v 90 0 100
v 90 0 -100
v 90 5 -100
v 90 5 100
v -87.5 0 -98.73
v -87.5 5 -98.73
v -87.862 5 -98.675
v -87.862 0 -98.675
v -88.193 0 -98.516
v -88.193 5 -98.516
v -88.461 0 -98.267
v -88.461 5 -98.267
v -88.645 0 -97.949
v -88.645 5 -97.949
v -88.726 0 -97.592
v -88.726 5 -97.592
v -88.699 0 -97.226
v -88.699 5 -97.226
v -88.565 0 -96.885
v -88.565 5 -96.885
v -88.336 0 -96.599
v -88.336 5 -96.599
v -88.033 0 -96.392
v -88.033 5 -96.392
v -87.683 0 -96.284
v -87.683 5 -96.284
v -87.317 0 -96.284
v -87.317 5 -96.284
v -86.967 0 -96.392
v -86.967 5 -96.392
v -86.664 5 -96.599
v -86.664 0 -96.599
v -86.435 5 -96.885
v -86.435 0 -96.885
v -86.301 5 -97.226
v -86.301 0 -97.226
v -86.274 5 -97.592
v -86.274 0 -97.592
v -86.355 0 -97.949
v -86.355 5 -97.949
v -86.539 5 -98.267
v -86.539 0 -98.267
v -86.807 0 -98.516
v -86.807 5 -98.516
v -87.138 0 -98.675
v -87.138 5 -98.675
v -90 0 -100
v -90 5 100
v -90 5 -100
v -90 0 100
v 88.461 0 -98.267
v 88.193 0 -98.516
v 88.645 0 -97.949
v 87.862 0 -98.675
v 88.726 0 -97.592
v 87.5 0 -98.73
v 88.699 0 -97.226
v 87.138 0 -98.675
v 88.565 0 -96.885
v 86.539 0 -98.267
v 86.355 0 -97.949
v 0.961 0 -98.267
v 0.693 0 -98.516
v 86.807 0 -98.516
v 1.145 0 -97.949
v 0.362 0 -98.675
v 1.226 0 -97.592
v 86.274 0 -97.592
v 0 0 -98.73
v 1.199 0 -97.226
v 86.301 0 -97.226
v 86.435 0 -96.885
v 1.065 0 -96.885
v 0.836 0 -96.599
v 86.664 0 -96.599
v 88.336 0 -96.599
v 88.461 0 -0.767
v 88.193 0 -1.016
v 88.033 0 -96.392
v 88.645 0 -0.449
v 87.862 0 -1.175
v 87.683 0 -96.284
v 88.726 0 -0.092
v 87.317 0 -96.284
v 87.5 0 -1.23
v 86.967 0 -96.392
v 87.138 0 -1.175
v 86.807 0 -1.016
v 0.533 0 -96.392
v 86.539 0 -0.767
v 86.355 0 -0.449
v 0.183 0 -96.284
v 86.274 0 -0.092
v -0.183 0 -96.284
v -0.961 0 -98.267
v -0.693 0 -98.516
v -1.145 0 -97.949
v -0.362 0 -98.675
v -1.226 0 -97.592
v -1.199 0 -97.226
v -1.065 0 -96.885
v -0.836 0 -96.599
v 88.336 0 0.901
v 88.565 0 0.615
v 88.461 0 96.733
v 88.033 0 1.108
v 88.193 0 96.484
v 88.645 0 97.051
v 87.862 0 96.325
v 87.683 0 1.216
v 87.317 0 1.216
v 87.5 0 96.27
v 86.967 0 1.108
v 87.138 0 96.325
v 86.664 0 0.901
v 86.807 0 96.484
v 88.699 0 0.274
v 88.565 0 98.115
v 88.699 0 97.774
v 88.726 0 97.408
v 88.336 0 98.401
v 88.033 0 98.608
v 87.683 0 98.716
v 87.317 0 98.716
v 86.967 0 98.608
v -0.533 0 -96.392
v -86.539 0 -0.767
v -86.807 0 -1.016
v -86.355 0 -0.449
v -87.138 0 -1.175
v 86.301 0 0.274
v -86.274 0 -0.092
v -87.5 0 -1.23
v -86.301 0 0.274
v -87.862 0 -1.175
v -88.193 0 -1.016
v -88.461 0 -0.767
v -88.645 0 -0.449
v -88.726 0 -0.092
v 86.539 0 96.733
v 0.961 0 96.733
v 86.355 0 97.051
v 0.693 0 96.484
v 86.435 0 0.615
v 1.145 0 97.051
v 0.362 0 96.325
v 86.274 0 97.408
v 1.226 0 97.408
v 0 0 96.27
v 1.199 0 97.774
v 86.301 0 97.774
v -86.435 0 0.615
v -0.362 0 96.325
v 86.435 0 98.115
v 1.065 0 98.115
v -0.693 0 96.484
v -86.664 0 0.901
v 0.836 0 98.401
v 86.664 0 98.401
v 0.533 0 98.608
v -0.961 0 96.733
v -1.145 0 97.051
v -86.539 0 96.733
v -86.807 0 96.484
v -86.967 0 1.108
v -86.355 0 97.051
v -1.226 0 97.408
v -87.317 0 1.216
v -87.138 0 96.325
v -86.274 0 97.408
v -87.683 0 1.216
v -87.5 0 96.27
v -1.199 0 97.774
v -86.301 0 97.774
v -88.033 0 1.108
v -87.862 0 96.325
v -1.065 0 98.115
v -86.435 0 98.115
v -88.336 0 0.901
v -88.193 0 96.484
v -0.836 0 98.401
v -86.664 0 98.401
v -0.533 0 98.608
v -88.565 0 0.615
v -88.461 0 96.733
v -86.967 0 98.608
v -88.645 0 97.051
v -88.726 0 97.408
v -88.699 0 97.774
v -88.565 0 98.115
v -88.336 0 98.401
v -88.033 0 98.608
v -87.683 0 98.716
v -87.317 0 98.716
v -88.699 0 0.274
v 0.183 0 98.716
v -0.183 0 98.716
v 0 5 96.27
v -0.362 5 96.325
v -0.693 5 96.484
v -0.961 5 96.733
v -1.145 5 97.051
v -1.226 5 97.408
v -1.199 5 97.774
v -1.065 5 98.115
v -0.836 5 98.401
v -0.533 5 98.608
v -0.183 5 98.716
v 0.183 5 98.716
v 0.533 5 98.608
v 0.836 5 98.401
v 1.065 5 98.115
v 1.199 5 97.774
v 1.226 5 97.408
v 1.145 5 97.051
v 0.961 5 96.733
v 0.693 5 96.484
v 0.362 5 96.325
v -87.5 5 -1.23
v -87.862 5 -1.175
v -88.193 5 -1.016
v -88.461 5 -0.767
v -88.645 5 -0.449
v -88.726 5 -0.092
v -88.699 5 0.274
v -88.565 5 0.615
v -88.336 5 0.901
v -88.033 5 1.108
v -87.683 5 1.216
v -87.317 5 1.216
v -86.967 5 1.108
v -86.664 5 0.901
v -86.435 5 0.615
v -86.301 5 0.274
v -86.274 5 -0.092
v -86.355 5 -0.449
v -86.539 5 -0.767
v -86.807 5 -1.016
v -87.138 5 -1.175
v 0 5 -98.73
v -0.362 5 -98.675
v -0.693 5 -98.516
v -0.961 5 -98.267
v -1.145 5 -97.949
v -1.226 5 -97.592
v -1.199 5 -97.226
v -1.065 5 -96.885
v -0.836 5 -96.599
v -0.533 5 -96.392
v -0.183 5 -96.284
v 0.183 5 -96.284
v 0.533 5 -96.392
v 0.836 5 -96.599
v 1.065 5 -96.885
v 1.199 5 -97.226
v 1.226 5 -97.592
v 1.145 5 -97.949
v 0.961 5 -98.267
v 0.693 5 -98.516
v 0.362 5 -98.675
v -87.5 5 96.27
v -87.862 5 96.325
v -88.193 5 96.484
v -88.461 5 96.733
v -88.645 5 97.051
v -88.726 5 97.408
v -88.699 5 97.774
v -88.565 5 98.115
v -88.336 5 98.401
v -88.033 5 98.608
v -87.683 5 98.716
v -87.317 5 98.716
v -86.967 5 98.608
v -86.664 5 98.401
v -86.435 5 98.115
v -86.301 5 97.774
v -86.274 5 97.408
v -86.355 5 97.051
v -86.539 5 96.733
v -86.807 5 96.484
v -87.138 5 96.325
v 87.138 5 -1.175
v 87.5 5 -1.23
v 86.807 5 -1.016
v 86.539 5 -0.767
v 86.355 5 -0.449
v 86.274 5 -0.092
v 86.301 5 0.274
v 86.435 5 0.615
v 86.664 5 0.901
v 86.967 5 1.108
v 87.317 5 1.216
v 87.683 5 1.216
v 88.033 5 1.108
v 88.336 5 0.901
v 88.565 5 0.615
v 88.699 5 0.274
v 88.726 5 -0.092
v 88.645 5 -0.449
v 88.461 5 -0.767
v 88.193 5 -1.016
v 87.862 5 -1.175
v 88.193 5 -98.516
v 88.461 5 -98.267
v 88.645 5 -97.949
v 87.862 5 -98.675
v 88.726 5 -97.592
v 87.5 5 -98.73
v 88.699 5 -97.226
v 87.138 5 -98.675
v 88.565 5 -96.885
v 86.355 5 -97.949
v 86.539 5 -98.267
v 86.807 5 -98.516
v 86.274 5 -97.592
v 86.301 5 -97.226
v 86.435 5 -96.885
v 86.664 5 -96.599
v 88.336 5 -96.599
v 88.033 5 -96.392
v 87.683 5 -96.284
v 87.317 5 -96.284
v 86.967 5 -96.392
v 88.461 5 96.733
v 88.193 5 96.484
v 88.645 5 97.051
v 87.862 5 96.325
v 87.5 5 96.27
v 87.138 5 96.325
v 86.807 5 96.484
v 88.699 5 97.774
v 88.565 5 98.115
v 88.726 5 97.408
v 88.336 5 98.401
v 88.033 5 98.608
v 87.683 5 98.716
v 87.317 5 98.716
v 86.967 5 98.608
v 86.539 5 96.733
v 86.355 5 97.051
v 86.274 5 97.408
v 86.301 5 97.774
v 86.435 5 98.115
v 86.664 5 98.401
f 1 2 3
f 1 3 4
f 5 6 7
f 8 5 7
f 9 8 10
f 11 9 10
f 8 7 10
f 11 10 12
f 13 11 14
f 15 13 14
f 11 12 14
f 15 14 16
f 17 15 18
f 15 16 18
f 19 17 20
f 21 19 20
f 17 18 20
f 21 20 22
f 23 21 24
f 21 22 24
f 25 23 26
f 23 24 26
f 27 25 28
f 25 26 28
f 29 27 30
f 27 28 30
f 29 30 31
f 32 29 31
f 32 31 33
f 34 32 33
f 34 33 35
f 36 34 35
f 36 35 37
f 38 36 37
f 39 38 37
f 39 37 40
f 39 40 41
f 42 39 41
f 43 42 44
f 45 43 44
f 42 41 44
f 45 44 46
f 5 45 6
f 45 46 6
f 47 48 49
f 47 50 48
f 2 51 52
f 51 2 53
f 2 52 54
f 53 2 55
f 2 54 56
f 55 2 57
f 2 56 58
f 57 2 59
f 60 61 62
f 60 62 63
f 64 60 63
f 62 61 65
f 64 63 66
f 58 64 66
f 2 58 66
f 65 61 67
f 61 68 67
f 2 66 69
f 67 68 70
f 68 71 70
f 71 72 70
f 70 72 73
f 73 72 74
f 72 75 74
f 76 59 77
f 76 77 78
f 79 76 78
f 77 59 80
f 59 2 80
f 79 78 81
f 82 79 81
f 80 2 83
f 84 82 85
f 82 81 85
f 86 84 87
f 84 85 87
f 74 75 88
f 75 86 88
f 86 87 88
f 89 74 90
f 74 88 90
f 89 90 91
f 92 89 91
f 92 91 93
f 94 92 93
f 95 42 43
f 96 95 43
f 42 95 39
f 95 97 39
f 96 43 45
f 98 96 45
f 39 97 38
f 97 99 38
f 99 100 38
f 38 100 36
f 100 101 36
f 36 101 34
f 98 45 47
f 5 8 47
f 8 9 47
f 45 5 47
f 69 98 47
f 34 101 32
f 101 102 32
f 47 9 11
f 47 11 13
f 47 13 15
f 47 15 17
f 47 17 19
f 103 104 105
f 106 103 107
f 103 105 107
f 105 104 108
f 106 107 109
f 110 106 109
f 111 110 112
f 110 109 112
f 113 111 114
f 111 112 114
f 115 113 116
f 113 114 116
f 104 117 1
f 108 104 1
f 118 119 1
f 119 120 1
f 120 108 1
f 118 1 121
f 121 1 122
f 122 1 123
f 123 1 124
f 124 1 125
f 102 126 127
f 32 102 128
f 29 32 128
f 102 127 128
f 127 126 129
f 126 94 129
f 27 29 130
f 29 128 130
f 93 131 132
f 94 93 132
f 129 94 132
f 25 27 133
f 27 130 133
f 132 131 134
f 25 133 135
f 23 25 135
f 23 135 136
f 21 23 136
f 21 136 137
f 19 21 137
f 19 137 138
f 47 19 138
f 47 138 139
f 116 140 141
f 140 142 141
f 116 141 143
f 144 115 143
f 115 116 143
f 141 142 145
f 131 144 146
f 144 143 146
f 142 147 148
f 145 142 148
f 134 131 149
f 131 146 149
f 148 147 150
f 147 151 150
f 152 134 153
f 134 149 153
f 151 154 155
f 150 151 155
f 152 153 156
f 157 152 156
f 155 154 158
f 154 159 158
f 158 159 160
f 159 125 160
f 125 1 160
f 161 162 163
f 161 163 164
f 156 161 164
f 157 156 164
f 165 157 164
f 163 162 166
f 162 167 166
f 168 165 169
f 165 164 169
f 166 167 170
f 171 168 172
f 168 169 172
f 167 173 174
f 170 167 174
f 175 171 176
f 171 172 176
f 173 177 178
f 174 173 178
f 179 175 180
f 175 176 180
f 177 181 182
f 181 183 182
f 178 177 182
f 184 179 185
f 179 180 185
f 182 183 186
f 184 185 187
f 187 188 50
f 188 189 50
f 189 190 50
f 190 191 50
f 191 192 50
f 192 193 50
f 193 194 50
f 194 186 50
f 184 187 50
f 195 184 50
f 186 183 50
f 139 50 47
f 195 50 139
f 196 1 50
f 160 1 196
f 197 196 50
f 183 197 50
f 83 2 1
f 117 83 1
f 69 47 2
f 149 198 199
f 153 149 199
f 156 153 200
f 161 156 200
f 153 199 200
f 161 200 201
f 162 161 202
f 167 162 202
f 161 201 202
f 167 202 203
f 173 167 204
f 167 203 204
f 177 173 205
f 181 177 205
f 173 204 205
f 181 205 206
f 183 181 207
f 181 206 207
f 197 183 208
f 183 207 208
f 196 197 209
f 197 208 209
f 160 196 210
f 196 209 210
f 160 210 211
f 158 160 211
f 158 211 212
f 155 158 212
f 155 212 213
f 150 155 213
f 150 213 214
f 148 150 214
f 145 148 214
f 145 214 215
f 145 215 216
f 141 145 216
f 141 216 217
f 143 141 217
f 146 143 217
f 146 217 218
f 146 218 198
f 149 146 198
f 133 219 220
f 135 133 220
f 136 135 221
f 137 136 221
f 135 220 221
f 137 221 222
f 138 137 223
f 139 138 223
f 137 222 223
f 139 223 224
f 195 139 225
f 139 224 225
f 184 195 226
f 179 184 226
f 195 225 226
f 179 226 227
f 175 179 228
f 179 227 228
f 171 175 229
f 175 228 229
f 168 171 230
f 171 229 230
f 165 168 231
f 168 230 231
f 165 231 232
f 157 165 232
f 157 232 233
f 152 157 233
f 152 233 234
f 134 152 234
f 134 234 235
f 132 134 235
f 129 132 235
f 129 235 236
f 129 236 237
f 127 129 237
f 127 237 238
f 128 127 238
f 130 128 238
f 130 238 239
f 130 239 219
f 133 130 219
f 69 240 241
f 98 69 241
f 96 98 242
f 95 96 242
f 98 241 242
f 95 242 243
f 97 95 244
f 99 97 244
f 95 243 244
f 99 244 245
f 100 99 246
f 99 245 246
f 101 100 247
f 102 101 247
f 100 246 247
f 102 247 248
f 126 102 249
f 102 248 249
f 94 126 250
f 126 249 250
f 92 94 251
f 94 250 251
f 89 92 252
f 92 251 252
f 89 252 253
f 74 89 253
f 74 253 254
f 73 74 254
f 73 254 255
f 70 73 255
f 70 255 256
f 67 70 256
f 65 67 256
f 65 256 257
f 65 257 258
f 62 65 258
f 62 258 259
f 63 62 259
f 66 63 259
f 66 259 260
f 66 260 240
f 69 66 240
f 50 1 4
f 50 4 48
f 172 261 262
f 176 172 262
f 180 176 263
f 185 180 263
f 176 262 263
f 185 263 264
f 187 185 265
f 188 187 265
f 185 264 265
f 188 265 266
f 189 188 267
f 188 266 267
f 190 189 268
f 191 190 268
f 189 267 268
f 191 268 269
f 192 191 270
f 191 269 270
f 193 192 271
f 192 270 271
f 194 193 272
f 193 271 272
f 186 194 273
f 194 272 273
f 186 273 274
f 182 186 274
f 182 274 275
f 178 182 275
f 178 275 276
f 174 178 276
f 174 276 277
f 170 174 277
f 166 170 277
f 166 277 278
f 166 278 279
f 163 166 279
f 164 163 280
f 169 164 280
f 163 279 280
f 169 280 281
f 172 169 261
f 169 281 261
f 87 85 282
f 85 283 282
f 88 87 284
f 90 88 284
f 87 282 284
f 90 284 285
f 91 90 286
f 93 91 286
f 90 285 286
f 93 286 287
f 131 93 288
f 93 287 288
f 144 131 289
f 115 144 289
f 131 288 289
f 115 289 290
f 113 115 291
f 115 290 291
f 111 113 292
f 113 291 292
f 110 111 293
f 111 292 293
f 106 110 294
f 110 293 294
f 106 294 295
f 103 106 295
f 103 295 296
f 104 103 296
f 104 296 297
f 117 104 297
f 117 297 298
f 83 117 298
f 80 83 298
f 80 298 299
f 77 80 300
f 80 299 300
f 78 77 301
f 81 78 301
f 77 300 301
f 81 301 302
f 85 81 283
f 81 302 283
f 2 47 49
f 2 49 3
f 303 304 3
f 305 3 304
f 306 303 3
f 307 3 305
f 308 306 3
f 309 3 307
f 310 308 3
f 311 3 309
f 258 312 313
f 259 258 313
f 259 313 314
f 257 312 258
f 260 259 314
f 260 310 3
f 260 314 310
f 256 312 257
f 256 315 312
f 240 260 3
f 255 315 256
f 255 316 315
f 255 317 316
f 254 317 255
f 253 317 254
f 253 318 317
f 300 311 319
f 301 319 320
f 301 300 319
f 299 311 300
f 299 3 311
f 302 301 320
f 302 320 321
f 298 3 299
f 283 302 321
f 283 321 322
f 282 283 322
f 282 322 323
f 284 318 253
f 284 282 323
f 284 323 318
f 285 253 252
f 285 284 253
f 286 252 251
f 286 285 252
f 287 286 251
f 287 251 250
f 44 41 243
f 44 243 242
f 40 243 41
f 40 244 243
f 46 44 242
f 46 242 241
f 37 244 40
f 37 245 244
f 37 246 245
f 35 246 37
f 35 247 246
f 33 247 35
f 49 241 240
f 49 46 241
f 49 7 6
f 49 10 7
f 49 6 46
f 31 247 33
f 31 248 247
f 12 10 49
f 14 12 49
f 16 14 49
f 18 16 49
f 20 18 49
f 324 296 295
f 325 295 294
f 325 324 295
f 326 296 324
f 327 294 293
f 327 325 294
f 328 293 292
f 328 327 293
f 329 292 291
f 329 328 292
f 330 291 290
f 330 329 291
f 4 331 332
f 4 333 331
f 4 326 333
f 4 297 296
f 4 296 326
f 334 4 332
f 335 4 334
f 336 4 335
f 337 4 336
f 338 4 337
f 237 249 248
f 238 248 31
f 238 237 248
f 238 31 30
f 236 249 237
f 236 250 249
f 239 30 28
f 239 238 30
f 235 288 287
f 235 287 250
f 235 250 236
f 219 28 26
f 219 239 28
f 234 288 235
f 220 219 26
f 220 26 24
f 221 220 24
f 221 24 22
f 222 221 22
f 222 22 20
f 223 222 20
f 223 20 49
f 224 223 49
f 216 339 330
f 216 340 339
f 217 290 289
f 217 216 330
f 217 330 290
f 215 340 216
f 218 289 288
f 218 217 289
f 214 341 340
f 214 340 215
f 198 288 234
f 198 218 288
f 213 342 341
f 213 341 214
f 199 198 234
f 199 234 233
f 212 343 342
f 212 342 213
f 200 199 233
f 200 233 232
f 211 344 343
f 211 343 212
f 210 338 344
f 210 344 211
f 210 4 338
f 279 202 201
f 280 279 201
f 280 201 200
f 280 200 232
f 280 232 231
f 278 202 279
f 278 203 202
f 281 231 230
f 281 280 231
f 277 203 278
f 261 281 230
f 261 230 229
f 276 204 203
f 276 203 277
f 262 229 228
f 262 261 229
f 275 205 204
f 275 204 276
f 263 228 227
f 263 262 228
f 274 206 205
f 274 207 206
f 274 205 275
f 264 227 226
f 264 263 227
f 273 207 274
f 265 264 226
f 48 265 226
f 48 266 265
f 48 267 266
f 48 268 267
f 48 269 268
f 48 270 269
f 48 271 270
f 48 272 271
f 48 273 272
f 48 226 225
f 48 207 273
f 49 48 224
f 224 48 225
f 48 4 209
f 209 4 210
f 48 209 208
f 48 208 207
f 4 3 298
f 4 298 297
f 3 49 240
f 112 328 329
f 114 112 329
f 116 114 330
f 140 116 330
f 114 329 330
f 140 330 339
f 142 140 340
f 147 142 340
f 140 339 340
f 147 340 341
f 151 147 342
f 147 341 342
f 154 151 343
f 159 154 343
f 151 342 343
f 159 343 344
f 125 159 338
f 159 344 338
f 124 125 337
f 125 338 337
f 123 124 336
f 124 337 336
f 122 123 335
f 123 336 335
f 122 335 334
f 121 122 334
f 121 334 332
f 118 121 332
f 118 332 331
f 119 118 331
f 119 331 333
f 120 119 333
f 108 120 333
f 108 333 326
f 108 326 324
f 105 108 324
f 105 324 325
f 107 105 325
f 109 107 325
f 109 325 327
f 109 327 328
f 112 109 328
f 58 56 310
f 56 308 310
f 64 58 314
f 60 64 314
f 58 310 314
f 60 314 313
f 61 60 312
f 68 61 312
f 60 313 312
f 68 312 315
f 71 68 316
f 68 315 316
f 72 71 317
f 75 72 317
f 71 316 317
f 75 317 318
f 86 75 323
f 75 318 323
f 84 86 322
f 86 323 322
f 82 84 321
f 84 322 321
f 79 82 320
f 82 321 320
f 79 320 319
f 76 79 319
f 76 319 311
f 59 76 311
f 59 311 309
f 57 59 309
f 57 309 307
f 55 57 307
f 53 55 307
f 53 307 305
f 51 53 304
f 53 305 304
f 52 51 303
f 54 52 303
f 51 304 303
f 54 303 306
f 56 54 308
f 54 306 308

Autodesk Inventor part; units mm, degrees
ref_plane "YZ Plane" through (0, 0, 0) normal (1, 0, 0) x (0, 1, 0)
ref_plane "XZ Plane" through (0, 0, 0) normal (0, 1, 0) x (-1, 0, 0)
ref_plane "XY Plane" through (0, 0, 0) normal (0, 0, 1) x (1, 0, 0)
sketch "Esquisse1" plane through (0, 0, 0) normal (0, 1, 0) x (-1, 0, 0)
  line L0 (90, -100) -> (-90, -100)
  line L1 (-90, -100) -> (-90, 100)
  line L2 (-90, 100) -> (90, 100)
  line L3 (90, 100) -> (90, -100)
  line L4 (90, -100) -> (-90, 100) construction
  line L5 (-90, -100) -> (90, 100) construction
  point P0 (0, 0)
  dimension "d0" = 180
  dimension "d1" = 200
extrude "Extrusion1" add sketch "Esquisse1" along normal blind 5
sketch "Esquisse3" plane through (0, 0, 0) normal (0, -1, 0) x (1, 0, 0)
  line L0 (0, 0) -> (87.5, 0)
  line L1 (87.5, 0) -> (87.5, -97.5)
  line L2 (0, 28.6272) -> (0, -29.3855)
  point P0 (87.5, 97.5)
  point P1 (-87.5, -97.5)
  point P2 (-87.5, 97.5)
  dimension "d18" = 87.5
  dimension "d19" = 97.5
hole "Perçage2" at (87.5, 0, -97.5) at (87.5, 0, 97.5) at (-87.5, 0, -97.5) at (-87.5, 0, 97.5) direction (0, 1, 0) diameter 2.459 end through all thread size "M3x0.5" class "6H" standard "ISO Metric profile"
sketch "Esquisse4" plane through (0, 0, 0) normal (0, -1, 0) x (1, 0, 0)
  line L0 (0, 0) -> (0, 97.5)
  line L1 (0, 0) -> (87.5, 0)
  point P0 (0, -97.5)
  point P1 (-87.5, 0)
  dimension "d27" = 97.5
  dimension "d28" = 87.5
hole "Perçage3" at (87.5, 0, 0) at (0, 0, 97.5) at (0, 0, -97.5) at (-87.5, 0, 0) direction (0, 1, 0) diameter 2.459 end through all thread size "M3x0.5" class "6H" standard "ISO Metric profile"
properties part number "chassis_bas"
